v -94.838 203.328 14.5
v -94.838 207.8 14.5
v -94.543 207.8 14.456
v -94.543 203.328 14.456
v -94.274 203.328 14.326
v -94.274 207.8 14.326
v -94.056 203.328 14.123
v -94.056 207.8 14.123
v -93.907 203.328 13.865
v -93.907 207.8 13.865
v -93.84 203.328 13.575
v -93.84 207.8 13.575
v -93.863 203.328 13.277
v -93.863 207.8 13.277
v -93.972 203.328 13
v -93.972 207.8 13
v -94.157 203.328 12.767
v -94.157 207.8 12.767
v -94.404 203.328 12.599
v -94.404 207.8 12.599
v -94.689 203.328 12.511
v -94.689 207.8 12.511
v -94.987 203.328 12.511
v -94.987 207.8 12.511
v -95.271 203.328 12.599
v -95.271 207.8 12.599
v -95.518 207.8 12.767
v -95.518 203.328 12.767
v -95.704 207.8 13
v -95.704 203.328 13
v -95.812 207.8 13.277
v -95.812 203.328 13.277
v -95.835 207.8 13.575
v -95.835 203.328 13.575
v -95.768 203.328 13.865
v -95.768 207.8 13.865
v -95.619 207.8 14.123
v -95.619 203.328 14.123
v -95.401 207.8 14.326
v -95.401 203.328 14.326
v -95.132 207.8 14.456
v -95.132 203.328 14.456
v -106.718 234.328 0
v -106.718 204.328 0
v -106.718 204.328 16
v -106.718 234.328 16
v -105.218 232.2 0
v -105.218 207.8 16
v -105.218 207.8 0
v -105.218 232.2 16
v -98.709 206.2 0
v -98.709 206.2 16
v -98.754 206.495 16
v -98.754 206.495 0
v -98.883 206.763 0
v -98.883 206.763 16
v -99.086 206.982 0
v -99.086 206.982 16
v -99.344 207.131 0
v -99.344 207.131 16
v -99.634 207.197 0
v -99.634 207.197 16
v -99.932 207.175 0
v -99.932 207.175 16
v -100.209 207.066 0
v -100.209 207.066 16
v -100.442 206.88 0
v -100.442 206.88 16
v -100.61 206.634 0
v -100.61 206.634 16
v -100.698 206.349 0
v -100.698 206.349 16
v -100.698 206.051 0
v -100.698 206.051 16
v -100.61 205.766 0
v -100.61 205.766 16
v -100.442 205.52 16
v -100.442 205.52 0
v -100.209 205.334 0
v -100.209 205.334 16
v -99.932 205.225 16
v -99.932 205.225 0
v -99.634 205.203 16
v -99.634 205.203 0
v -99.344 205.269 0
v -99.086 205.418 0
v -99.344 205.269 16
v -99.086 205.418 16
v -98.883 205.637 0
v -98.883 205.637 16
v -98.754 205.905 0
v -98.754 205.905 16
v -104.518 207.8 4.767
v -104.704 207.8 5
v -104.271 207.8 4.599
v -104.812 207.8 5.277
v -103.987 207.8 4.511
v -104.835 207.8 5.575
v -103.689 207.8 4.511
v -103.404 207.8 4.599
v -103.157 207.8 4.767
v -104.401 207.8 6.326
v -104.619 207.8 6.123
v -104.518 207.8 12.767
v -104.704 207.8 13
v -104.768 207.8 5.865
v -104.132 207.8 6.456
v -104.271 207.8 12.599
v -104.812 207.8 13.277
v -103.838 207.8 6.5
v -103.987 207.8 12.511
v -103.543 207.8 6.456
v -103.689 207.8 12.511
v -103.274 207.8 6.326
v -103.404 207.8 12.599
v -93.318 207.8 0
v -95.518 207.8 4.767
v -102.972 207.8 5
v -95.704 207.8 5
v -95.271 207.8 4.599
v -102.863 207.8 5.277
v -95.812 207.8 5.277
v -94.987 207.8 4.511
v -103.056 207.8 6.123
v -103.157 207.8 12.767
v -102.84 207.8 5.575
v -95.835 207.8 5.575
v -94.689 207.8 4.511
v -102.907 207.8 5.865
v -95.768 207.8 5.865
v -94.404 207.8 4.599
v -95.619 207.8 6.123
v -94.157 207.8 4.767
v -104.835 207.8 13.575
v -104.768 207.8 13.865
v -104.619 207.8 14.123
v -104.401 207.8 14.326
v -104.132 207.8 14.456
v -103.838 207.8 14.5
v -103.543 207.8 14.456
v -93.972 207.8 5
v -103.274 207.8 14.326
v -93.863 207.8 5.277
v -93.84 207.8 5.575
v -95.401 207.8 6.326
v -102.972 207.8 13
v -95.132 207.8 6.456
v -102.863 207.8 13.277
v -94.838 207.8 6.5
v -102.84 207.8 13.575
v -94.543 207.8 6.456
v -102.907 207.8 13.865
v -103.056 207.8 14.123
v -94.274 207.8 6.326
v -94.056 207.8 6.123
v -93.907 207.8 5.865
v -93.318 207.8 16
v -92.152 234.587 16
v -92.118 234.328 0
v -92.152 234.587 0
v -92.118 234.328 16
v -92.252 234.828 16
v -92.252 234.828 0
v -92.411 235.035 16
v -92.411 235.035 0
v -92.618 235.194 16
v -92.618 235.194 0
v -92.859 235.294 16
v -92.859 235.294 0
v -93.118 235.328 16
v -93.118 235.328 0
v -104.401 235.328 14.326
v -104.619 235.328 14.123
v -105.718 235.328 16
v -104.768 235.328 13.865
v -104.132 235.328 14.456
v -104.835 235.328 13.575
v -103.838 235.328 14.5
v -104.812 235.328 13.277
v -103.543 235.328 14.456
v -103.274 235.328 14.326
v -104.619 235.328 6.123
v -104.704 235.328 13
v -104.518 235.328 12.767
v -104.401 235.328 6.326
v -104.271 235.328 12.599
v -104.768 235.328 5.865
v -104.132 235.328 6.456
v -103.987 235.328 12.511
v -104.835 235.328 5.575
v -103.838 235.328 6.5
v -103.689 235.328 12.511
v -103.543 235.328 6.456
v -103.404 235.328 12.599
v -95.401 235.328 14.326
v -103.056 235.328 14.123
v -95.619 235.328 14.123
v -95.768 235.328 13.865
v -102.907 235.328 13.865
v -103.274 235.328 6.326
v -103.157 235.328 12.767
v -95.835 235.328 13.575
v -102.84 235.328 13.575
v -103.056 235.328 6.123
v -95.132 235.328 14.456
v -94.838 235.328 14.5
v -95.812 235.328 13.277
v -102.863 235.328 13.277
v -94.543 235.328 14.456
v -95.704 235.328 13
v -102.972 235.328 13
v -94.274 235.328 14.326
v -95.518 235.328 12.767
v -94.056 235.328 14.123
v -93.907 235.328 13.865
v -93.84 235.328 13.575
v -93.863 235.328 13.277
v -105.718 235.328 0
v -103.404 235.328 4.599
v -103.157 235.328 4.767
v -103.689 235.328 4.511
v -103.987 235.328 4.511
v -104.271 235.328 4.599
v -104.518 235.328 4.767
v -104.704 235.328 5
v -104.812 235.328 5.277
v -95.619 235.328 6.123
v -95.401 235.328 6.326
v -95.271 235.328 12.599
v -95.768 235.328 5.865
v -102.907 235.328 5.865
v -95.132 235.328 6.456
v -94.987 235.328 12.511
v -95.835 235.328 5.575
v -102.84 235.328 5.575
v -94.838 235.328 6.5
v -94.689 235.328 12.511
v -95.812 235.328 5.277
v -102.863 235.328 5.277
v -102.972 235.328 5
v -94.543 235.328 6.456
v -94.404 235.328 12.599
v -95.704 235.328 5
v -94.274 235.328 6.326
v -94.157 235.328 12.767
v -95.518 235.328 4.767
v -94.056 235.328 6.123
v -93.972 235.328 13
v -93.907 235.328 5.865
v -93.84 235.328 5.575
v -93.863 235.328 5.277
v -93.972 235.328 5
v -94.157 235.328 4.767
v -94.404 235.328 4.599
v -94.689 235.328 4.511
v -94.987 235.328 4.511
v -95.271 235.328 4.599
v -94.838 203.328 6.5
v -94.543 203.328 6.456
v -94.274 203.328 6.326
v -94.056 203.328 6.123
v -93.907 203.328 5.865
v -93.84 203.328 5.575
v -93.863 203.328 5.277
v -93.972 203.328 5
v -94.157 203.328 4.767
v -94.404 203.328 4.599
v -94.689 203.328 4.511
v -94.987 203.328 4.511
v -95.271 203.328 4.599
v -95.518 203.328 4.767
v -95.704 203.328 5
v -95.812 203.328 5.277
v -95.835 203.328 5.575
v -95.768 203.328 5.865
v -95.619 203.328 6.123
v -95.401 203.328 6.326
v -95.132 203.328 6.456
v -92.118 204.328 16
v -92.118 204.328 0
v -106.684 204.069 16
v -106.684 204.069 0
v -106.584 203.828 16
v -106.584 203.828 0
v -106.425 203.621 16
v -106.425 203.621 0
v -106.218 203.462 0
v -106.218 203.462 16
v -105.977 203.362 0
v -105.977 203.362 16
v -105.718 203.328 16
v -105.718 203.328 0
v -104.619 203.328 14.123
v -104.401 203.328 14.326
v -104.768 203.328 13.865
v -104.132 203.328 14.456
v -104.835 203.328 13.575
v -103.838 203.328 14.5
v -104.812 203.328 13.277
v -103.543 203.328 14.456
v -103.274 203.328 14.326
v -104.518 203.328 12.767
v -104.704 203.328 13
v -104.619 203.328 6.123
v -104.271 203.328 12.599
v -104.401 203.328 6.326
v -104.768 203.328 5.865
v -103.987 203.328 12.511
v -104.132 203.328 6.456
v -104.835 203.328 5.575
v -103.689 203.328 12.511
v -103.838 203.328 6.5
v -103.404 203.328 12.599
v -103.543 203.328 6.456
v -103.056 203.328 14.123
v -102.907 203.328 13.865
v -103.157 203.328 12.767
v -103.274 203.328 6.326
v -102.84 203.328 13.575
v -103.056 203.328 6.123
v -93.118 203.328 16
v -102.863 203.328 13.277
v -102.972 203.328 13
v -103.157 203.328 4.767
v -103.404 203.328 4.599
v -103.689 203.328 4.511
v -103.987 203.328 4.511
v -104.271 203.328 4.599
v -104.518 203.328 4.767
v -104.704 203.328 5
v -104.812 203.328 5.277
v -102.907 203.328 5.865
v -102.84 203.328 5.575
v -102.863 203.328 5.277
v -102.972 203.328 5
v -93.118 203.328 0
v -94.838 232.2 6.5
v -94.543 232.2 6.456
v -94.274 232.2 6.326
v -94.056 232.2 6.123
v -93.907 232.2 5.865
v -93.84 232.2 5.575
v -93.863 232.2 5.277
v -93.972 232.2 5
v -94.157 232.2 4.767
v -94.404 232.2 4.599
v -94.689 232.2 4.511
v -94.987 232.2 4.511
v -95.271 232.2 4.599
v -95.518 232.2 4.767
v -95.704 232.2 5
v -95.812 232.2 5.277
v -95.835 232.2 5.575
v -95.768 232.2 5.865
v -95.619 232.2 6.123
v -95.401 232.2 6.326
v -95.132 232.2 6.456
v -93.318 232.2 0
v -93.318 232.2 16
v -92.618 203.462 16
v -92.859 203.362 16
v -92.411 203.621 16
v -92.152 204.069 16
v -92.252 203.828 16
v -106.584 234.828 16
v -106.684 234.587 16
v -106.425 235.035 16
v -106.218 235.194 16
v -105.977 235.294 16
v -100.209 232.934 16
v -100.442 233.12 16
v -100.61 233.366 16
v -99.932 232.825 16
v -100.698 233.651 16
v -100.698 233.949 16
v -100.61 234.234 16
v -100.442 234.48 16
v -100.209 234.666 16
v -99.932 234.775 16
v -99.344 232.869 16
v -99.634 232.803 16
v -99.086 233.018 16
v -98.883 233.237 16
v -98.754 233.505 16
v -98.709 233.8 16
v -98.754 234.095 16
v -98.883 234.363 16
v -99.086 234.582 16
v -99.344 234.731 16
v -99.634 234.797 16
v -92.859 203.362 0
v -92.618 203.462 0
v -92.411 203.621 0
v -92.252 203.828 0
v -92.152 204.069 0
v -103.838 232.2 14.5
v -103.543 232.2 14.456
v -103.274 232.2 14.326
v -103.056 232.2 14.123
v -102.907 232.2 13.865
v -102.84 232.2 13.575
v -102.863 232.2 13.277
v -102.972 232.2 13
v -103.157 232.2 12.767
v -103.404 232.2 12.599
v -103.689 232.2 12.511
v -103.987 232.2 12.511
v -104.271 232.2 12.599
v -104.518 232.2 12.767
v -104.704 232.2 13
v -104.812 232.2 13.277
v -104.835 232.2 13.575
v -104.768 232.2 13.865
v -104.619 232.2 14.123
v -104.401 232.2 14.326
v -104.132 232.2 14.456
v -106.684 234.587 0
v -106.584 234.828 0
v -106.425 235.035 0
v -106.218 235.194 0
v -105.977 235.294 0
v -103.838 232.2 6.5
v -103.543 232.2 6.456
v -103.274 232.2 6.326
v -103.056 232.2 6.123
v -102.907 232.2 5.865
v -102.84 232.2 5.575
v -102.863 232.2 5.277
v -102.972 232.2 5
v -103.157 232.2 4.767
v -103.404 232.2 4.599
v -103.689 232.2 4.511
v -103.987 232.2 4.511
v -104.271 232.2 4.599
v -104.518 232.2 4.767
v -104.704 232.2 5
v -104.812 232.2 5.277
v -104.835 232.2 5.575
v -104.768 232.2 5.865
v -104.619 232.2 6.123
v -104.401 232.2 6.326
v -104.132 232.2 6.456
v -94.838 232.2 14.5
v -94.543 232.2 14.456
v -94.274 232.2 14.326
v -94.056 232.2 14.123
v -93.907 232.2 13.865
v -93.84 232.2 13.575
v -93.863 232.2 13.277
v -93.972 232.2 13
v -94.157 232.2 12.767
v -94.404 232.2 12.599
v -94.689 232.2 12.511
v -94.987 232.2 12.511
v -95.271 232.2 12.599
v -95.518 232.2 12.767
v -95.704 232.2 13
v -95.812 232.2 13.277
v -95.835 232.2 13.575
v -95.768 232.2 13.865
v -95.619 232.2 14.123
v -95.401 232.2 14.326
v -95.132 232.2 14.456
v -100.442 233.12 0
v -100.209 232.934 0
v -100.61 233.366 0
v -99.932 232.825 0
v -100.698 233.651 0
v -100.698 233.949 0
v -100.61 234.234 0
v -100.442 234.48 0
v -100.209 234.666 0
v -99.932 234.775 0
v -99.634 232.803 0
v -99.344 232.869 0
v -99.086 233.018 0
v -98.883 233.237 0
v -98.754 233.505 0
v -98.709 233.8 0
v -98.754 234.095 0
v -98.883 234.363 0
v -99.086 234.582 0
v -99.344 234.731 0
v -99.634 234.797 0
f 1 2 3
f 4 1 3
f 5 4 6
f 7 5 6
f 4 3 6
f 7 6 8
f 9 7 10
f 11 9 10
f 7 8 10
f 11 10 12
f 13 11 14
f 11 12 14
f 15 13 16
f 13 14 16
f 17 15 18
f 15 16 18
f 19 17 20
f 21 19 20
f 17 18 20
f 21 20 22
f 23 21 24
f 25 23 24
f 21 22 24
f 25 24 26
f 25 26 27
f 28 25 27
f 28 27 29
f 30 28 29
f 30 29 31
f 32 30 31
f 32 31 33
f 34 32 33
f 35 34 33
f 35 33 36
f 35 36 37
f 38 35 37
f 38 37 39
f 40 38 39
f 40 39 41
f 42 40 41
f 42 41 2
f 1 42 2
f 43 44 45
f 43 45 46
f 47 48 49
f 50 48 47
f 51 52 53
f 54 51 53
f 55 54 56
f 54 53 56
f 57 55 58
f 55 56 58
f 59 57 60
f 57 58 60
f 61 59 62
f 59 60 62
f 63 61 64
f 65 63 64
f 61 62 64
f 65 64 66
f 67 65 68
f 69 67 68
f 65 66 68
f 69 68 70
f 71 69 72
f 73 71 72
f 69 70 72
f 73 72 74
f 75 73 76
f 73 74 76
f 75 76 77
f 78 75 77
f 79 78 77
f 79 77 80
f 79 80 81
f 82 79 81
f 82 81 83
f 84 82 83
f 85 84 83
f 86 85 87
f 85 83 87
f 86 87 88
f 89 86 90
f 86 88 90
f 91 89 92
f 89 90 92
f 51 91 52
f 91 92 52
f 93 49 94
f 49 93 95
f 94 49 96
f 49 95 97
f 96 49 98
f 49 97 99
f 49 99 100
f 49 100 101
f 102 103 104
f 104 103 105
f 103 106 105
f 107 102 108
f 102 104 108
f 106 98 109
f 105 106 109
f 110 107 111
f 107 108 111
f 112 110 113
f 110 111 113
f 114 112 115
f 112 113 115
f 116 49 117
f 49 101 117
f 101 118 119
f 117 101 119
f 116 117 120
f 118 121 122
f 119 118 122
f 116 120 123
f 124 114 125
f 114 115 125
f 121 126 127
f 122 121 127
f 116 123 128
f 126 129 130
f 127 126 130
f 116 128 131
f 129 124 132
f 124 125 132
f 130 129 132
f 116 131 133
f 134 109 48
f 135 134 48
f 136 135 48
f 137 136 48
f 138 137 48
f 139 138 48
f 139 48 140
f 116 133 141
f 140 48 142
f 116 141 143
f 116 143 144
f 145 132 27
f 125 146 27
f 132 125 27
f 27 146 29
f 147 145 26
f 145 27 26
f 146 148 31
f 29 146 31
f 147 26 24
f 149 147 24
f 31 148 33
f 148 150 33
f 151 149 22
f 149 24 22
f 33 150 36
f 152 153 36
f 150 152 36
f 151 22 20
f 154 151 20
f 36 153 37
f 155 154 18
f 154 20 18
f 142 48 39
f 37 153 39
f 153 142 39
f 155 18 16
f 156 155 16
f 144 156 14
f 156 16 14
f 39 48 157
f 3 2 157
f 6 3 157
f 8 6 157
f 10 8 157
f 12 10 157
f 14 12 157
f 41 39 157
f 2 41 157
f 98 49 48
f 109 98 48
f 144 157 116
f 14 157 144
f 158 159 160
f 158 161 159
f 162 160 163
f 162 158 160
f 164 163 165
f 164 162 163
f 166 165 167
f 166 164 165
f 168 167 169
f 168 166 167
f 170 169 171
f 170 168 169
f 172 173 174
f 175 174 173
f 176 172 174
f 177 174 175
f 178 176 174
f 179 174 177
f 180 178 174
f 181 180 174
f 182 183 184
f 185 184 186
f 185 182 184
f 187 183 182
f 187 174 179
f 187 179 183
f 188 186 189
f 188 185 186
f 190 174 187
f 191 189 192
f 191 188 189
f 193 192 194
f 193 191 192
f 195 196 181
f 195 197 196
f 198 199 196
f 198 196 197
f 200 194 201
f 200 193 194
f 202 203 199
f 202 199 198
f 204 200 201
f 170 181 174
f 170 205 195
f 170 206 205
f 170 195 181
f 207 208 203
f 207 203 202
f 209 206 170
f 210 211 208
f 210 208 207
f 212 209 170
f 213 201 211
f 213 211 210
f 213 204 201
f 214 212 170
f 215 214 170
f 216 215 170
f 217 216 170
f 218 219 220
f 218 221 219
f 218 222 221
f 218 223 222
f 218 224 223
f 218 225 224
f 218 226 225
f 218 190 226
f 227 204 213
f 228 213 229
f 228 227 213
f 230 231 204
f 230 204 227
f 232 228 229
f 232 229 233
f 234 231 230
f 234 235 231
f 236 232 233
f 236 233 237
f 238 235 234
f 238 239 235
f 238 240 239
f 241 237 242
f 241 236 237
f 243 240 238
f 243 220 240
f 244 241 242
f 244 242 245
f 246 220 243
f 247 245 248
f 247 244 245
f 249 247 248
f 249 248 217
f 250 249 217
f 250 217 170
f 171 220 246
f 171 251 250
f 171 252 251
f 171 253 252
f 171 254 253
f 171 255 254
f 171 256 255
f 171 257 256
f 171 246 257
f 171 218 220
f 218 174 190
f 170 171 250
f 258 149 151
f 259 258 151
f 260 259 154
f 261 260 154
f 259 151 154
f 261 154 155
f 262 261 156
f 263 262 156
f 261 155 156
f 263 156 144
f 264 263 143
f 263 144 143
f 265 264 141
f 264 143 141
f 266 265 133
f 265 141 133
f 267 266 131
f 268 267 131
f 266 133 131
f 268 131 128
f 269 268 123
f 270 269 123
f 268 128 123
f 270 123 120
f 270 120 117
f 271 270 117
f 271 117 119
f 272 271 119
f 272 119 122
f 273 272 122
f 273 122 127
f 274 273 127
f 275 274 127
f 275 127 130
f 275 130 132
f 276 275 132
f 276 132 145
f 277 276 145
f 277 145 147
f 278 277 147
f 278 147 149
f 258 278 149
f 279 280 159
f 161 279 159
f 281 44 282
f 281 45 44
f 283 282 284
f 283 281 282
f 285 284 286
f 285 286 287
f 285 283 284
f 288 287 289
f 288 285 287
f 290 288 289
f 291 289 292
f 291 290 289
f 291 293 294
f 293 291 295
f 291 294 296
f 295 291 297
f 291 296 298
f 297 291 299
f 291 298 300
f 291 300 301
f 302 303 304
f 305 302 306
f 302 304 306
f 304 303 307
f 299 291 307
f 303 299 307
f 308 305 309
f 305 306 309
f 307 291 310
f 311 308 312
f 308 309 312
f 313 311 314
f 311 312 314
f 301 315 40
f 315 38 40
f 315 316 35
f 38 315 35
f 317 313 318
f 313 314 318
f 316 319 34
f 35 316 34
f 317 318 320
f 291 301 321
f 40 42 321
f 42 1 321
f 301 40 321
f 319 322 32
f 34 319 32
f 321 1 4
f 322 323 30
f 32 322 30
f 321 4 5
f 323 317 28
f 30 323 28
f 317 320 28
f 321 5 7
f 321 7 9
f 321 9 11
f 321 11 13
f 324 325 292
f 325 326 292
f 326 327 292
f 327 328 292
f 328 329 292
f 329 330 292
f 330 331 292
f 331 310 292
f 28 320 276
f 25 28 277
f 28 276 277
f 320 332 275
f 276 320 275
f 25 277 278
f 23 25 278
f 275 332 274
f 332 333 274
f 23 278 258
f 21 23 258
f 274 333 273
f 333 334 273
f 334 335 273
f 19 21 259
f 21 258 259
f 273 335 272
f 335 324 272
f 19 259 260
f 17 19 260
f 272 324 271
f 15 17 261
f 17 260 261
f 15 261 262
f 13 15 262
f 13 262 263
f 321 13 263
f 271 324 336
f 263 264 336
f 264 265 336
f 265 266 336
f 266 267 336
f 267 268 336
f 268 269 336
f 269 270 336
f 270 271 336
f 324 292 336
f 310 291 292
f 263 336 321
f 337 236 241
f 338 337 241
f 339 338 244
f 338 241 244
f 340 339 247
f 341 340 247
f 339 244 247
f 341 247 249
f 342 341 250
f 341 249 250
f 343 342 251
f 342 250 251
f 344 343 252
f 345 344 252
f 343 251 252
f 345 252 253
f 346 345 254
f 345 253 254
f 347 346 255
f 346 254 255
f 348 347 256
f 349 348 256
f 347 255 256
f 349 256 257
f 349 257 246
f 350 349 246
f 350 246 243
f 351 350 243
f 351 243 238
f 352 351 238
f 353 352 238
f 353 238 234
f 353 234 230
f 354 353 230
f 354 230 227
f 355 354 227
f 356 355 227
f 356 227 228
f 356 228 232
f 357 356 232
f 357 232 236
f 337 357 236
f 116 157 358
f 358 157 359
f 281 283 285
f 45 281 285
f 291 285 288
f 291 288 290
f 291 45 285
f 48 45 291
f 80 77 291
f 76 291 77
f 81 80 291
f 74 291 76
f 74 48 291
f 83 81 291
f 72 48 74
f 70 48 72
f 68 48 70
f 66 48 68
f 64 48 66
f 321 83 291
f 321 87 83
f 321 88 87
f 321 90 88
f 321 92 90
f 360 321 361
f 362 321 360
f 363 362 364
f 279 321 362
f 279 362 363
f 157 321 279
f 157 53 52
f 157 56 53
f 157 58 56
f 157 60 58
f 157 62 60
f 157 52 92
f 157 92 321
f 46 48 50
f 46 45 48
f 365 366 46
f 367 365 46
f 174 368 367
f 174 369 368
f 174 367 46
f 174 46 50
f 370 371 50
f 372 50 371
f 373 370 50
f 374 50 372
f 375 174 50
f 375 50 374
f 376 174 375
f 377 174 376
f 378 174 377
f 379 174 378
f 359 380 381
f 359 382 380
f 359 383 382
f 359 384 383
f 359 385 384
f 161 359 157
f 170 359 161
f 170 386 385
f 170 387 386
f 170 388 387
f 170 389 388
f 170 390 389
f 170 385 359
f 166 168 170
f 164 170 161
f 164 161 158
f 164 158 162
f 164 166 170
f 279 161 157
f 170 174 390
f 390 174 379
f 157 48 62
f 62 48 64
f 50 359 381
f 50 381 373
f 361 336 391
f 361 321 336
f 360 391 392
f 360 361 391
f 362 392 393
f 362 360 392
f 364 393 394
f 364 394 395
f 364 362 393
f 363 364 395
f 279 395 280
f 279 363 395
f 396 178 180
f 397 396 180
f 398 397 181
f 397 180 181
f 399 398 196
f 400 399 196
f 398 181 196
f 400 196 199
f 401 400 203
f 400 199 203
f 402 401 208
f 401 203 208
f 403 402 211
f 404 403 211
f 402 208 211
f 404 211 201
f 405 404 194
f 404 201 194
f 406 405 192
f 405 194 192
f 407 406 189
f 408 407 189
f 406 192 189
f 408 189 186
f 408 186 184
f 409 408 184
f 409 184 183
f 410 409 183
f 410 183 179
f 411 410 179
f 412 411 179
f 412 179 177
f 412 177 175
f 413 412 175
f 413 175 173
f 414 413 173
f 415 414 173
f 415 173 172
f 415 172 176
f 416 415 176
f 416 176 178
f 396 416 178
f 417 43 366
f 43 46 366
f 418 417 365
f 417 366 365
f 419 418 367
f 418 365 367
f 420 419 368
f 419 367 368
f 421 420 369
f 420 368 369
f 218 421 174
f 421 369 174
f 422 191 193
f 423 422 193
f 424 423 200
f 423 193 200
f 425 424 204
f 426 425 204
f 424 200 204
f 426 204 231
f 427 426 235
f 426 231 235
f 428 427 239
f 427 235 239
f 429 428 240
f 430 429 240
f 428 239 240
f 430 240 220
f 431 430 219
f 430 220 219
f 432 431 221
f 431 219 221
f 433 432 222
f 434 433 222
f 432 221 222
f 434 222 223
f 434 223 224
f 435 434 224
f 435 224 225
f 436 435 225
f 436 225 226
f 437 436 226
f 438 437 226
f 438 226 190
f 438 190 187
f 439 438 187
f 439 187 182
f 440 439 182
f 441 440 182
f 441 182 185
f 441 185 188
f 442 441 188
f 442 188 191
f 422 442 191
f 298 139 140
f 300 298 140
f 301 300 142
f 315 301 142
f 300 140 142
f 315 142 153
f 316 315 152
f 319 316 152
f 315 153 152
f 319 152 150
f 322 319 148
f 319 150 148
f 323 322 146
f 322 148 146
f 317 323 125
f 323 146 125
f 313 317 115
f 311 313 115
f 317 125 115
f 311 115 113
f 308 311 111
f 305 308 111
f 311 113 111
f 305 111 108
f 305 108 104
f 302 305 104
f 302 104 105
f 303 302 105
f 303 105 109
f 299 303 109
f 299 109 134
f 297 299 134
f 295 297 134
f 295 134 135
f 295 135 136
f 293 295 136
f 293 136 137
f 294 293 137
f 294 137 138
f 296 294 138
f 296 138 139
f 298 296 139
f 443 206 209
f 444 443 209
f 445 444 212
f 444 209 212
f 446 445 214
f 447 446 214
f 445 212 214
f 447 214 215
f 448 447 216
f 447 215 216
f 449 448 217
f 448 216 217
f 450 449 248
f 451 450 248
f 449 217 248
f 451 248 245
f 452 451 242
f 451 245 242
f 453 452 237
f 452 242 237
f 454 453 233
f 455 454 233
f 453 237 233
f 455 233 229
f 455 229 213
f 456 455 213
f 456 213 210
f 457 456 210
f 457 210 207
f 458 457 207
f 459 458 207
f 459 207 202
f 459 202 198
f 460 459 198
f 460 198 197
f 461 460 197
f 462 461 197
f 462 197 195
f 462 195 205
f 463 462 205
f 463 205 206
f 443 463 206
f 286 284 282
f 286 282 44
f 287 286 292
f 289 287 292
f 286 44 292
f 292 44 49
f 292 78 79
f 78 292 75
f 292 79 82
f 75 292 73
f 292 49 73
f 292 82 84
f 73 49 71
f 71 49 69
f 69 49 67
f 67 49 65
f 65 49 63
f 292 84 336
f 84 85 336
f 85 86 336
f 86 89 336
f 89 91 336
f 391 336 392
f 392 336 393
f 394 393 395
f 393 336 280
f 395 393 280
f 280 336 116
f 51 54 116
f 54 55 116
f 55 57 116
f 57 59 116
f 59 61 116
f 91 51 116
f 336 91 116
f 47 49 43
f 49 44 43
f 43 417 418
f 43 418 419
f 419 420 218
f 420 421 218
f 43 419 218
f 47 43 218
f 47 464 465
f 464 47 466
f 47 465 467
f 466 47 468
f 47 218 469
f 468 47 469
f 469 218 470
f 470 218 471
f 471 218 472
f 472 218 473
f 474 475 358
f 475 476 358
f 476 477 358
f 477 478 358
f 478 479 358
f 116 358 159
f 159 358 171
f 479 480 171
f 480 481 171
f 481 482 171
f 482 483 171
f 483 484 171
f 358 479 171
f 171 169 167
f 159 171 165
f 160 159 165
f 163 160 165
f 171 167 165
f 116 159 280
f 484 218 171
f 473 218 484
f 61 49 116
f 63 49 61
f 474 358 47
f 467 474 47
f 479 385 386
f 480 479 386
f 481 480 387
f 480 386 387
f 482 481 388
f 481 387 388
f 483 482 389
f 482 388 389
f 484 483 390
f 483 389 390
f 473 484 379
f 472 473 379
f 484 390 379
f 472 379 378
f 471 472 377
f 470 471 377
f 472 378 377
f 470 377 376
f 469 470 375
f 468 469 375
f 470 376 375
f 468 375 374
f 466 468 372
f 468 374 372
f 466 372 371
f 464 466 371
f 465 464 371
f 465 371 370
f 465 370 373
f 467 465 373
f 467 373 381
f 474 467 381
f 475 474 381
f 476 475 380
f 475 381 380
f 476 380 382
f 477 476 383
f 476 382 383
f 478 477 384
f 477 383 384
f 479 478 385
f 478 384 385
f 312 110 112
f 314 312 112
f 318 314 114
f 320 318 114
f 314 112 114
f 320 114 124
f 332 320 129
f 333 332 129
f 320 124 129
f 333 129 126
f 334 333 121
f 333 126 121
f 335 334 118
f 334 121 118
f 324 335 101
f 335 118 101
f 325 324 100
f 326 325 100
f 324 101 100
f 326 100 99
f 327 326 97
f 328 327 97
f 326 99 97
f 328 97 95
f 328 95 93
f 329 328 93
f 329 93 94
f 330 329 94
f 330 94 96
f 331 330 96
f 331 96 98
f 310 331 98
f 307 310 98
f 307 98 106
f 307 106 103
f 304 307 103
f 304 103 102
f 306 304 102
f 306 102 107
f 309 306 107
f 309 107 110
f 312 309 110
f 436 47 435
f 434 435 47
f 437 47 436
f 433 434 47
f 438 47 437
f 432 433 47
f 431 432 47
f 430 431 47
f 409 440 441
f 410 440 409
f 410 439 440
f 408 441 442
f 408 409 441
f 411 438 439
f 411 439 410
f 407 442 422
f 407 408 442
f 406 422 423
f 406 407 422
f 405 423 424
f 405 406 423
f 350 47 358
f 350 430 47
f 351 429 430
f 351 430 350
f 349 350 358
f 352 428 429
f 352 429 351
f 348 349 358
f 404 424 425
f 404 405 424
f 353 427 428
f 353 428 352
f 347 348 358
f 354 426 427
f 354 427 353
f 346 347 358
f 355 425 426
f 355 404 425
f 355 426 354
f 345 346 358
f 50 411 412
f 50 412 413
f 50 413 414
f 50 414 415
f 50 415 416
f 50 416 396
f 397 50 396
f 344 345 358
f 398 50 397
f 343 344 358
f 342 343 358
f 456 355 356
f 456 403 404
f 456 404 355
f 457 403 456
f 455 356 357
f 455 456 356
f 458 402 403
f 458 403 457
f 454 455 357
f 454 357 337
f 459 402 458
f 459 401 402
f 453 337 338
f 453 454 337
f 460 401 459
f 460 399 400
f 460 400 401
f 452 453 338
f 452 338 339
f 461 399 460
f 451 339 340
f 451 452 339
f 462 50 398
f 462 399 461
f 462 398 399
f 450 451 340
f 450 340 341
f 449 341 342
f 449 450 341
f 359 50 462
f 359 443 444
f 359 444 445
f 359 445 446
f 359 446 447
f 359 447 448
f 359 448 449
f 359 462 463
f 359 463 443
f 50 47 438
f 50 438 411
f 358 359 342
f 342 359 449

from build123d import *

# Parameters (mm, degrees)
SKETCH2_W           = 14.6
SKETCH2_H           = 32
BOSS_EXTRUDE1_DEPTH = 16
FILLET1_R           = 1
SKETCH3_W           = 11.9
SKETCH3_H           = 24.4
CUT_EXTRUDE1_DEPTH  = 16
SKETCH4_R           = 1
CUT_EXTRUDE2_DEPTH  = 16
SKETCH5_R           = 1
CUT_EXTRUDE3_DEPTH  = 113.555199241


with BuildPart() as part:
    # Sketch2 → Boss-Extrude1 (new body)
    with BuildSketch(Plane.XY):
        with Locations((-99.41772522, 219.327818509)):
            Rectangle(SKETCH2_W, SKETCH2_H)
    extrude(amount=BOSS_EXTRUDE1_DEPTH)

    # Fillet1
    fillet1_edges = [part.edges().sort_by_distance(p)[0] for p in [
        (-106.71772522, 235.327818509, 8),
        (-92.11772522, 235.327818509, 8),
        (-92.11772522, 203.327818509, 8),
        (-106.71772522, 203.327818509, 8),
    ]]
    fillet(fillet1_edges, radius=FILLET1_R)

    # Sketch3 → Cut-Extrude1 (cut)
    with BuildSketch(Plane.XY.offset(16)):
        with Locations((-99.26772522, 219.999996948)):
            Rectangle(SKETCH3_W, SKETCH3_H)
    extrude(amount=-CUT_EXTRUDE1_DEPTH, mode=Mode.SUBTRACT)

    # Sketch4 → Cut-Extrude2 (cut)
    with BuildSketch(Plane.XY.offset(16)):
        with Locations((-99.709122305, 233.799996948)):
            Circle(SKETCH4_R)
        with Locations((-99.709122305, 206.199996948)):
            Circle(SKETCH4_R)
    extrude(amount=-CUT_EXTRUDE2_DEPTH, mode=Mode.SUBTRACT)

    # Sketch5 → Cut-Extrude3 (cut, through all)
    with BuildSketch(Plane(origin=(0, 235.327818509, 0), x_dir=(1, 0, 0), z_dir=(0, 1, 0))):
        with Locations(Location((-103.837557169, -5.5, 0), (0, 0, 270))):
            Circle(SKETCH5_R)
        with Locations(Location((-94.837557169, -5.5, 0), (0, 0, 270))):
            Circle(SKETCH5_R)
        with Locations(Location((-94.837557169, -13.5, 0), (0, 0, 270))):
            Circle(SKETCH5_R)
        with Locations(Location((-103.837557169, -13.5, 0), (0, 0, 270))):
            Circle(SKETCH5_R)
    extrude(amount=-CUT_EXTRUDE3_DEPTH, mode=Mode.SUBTRACT)


solid = part.part
